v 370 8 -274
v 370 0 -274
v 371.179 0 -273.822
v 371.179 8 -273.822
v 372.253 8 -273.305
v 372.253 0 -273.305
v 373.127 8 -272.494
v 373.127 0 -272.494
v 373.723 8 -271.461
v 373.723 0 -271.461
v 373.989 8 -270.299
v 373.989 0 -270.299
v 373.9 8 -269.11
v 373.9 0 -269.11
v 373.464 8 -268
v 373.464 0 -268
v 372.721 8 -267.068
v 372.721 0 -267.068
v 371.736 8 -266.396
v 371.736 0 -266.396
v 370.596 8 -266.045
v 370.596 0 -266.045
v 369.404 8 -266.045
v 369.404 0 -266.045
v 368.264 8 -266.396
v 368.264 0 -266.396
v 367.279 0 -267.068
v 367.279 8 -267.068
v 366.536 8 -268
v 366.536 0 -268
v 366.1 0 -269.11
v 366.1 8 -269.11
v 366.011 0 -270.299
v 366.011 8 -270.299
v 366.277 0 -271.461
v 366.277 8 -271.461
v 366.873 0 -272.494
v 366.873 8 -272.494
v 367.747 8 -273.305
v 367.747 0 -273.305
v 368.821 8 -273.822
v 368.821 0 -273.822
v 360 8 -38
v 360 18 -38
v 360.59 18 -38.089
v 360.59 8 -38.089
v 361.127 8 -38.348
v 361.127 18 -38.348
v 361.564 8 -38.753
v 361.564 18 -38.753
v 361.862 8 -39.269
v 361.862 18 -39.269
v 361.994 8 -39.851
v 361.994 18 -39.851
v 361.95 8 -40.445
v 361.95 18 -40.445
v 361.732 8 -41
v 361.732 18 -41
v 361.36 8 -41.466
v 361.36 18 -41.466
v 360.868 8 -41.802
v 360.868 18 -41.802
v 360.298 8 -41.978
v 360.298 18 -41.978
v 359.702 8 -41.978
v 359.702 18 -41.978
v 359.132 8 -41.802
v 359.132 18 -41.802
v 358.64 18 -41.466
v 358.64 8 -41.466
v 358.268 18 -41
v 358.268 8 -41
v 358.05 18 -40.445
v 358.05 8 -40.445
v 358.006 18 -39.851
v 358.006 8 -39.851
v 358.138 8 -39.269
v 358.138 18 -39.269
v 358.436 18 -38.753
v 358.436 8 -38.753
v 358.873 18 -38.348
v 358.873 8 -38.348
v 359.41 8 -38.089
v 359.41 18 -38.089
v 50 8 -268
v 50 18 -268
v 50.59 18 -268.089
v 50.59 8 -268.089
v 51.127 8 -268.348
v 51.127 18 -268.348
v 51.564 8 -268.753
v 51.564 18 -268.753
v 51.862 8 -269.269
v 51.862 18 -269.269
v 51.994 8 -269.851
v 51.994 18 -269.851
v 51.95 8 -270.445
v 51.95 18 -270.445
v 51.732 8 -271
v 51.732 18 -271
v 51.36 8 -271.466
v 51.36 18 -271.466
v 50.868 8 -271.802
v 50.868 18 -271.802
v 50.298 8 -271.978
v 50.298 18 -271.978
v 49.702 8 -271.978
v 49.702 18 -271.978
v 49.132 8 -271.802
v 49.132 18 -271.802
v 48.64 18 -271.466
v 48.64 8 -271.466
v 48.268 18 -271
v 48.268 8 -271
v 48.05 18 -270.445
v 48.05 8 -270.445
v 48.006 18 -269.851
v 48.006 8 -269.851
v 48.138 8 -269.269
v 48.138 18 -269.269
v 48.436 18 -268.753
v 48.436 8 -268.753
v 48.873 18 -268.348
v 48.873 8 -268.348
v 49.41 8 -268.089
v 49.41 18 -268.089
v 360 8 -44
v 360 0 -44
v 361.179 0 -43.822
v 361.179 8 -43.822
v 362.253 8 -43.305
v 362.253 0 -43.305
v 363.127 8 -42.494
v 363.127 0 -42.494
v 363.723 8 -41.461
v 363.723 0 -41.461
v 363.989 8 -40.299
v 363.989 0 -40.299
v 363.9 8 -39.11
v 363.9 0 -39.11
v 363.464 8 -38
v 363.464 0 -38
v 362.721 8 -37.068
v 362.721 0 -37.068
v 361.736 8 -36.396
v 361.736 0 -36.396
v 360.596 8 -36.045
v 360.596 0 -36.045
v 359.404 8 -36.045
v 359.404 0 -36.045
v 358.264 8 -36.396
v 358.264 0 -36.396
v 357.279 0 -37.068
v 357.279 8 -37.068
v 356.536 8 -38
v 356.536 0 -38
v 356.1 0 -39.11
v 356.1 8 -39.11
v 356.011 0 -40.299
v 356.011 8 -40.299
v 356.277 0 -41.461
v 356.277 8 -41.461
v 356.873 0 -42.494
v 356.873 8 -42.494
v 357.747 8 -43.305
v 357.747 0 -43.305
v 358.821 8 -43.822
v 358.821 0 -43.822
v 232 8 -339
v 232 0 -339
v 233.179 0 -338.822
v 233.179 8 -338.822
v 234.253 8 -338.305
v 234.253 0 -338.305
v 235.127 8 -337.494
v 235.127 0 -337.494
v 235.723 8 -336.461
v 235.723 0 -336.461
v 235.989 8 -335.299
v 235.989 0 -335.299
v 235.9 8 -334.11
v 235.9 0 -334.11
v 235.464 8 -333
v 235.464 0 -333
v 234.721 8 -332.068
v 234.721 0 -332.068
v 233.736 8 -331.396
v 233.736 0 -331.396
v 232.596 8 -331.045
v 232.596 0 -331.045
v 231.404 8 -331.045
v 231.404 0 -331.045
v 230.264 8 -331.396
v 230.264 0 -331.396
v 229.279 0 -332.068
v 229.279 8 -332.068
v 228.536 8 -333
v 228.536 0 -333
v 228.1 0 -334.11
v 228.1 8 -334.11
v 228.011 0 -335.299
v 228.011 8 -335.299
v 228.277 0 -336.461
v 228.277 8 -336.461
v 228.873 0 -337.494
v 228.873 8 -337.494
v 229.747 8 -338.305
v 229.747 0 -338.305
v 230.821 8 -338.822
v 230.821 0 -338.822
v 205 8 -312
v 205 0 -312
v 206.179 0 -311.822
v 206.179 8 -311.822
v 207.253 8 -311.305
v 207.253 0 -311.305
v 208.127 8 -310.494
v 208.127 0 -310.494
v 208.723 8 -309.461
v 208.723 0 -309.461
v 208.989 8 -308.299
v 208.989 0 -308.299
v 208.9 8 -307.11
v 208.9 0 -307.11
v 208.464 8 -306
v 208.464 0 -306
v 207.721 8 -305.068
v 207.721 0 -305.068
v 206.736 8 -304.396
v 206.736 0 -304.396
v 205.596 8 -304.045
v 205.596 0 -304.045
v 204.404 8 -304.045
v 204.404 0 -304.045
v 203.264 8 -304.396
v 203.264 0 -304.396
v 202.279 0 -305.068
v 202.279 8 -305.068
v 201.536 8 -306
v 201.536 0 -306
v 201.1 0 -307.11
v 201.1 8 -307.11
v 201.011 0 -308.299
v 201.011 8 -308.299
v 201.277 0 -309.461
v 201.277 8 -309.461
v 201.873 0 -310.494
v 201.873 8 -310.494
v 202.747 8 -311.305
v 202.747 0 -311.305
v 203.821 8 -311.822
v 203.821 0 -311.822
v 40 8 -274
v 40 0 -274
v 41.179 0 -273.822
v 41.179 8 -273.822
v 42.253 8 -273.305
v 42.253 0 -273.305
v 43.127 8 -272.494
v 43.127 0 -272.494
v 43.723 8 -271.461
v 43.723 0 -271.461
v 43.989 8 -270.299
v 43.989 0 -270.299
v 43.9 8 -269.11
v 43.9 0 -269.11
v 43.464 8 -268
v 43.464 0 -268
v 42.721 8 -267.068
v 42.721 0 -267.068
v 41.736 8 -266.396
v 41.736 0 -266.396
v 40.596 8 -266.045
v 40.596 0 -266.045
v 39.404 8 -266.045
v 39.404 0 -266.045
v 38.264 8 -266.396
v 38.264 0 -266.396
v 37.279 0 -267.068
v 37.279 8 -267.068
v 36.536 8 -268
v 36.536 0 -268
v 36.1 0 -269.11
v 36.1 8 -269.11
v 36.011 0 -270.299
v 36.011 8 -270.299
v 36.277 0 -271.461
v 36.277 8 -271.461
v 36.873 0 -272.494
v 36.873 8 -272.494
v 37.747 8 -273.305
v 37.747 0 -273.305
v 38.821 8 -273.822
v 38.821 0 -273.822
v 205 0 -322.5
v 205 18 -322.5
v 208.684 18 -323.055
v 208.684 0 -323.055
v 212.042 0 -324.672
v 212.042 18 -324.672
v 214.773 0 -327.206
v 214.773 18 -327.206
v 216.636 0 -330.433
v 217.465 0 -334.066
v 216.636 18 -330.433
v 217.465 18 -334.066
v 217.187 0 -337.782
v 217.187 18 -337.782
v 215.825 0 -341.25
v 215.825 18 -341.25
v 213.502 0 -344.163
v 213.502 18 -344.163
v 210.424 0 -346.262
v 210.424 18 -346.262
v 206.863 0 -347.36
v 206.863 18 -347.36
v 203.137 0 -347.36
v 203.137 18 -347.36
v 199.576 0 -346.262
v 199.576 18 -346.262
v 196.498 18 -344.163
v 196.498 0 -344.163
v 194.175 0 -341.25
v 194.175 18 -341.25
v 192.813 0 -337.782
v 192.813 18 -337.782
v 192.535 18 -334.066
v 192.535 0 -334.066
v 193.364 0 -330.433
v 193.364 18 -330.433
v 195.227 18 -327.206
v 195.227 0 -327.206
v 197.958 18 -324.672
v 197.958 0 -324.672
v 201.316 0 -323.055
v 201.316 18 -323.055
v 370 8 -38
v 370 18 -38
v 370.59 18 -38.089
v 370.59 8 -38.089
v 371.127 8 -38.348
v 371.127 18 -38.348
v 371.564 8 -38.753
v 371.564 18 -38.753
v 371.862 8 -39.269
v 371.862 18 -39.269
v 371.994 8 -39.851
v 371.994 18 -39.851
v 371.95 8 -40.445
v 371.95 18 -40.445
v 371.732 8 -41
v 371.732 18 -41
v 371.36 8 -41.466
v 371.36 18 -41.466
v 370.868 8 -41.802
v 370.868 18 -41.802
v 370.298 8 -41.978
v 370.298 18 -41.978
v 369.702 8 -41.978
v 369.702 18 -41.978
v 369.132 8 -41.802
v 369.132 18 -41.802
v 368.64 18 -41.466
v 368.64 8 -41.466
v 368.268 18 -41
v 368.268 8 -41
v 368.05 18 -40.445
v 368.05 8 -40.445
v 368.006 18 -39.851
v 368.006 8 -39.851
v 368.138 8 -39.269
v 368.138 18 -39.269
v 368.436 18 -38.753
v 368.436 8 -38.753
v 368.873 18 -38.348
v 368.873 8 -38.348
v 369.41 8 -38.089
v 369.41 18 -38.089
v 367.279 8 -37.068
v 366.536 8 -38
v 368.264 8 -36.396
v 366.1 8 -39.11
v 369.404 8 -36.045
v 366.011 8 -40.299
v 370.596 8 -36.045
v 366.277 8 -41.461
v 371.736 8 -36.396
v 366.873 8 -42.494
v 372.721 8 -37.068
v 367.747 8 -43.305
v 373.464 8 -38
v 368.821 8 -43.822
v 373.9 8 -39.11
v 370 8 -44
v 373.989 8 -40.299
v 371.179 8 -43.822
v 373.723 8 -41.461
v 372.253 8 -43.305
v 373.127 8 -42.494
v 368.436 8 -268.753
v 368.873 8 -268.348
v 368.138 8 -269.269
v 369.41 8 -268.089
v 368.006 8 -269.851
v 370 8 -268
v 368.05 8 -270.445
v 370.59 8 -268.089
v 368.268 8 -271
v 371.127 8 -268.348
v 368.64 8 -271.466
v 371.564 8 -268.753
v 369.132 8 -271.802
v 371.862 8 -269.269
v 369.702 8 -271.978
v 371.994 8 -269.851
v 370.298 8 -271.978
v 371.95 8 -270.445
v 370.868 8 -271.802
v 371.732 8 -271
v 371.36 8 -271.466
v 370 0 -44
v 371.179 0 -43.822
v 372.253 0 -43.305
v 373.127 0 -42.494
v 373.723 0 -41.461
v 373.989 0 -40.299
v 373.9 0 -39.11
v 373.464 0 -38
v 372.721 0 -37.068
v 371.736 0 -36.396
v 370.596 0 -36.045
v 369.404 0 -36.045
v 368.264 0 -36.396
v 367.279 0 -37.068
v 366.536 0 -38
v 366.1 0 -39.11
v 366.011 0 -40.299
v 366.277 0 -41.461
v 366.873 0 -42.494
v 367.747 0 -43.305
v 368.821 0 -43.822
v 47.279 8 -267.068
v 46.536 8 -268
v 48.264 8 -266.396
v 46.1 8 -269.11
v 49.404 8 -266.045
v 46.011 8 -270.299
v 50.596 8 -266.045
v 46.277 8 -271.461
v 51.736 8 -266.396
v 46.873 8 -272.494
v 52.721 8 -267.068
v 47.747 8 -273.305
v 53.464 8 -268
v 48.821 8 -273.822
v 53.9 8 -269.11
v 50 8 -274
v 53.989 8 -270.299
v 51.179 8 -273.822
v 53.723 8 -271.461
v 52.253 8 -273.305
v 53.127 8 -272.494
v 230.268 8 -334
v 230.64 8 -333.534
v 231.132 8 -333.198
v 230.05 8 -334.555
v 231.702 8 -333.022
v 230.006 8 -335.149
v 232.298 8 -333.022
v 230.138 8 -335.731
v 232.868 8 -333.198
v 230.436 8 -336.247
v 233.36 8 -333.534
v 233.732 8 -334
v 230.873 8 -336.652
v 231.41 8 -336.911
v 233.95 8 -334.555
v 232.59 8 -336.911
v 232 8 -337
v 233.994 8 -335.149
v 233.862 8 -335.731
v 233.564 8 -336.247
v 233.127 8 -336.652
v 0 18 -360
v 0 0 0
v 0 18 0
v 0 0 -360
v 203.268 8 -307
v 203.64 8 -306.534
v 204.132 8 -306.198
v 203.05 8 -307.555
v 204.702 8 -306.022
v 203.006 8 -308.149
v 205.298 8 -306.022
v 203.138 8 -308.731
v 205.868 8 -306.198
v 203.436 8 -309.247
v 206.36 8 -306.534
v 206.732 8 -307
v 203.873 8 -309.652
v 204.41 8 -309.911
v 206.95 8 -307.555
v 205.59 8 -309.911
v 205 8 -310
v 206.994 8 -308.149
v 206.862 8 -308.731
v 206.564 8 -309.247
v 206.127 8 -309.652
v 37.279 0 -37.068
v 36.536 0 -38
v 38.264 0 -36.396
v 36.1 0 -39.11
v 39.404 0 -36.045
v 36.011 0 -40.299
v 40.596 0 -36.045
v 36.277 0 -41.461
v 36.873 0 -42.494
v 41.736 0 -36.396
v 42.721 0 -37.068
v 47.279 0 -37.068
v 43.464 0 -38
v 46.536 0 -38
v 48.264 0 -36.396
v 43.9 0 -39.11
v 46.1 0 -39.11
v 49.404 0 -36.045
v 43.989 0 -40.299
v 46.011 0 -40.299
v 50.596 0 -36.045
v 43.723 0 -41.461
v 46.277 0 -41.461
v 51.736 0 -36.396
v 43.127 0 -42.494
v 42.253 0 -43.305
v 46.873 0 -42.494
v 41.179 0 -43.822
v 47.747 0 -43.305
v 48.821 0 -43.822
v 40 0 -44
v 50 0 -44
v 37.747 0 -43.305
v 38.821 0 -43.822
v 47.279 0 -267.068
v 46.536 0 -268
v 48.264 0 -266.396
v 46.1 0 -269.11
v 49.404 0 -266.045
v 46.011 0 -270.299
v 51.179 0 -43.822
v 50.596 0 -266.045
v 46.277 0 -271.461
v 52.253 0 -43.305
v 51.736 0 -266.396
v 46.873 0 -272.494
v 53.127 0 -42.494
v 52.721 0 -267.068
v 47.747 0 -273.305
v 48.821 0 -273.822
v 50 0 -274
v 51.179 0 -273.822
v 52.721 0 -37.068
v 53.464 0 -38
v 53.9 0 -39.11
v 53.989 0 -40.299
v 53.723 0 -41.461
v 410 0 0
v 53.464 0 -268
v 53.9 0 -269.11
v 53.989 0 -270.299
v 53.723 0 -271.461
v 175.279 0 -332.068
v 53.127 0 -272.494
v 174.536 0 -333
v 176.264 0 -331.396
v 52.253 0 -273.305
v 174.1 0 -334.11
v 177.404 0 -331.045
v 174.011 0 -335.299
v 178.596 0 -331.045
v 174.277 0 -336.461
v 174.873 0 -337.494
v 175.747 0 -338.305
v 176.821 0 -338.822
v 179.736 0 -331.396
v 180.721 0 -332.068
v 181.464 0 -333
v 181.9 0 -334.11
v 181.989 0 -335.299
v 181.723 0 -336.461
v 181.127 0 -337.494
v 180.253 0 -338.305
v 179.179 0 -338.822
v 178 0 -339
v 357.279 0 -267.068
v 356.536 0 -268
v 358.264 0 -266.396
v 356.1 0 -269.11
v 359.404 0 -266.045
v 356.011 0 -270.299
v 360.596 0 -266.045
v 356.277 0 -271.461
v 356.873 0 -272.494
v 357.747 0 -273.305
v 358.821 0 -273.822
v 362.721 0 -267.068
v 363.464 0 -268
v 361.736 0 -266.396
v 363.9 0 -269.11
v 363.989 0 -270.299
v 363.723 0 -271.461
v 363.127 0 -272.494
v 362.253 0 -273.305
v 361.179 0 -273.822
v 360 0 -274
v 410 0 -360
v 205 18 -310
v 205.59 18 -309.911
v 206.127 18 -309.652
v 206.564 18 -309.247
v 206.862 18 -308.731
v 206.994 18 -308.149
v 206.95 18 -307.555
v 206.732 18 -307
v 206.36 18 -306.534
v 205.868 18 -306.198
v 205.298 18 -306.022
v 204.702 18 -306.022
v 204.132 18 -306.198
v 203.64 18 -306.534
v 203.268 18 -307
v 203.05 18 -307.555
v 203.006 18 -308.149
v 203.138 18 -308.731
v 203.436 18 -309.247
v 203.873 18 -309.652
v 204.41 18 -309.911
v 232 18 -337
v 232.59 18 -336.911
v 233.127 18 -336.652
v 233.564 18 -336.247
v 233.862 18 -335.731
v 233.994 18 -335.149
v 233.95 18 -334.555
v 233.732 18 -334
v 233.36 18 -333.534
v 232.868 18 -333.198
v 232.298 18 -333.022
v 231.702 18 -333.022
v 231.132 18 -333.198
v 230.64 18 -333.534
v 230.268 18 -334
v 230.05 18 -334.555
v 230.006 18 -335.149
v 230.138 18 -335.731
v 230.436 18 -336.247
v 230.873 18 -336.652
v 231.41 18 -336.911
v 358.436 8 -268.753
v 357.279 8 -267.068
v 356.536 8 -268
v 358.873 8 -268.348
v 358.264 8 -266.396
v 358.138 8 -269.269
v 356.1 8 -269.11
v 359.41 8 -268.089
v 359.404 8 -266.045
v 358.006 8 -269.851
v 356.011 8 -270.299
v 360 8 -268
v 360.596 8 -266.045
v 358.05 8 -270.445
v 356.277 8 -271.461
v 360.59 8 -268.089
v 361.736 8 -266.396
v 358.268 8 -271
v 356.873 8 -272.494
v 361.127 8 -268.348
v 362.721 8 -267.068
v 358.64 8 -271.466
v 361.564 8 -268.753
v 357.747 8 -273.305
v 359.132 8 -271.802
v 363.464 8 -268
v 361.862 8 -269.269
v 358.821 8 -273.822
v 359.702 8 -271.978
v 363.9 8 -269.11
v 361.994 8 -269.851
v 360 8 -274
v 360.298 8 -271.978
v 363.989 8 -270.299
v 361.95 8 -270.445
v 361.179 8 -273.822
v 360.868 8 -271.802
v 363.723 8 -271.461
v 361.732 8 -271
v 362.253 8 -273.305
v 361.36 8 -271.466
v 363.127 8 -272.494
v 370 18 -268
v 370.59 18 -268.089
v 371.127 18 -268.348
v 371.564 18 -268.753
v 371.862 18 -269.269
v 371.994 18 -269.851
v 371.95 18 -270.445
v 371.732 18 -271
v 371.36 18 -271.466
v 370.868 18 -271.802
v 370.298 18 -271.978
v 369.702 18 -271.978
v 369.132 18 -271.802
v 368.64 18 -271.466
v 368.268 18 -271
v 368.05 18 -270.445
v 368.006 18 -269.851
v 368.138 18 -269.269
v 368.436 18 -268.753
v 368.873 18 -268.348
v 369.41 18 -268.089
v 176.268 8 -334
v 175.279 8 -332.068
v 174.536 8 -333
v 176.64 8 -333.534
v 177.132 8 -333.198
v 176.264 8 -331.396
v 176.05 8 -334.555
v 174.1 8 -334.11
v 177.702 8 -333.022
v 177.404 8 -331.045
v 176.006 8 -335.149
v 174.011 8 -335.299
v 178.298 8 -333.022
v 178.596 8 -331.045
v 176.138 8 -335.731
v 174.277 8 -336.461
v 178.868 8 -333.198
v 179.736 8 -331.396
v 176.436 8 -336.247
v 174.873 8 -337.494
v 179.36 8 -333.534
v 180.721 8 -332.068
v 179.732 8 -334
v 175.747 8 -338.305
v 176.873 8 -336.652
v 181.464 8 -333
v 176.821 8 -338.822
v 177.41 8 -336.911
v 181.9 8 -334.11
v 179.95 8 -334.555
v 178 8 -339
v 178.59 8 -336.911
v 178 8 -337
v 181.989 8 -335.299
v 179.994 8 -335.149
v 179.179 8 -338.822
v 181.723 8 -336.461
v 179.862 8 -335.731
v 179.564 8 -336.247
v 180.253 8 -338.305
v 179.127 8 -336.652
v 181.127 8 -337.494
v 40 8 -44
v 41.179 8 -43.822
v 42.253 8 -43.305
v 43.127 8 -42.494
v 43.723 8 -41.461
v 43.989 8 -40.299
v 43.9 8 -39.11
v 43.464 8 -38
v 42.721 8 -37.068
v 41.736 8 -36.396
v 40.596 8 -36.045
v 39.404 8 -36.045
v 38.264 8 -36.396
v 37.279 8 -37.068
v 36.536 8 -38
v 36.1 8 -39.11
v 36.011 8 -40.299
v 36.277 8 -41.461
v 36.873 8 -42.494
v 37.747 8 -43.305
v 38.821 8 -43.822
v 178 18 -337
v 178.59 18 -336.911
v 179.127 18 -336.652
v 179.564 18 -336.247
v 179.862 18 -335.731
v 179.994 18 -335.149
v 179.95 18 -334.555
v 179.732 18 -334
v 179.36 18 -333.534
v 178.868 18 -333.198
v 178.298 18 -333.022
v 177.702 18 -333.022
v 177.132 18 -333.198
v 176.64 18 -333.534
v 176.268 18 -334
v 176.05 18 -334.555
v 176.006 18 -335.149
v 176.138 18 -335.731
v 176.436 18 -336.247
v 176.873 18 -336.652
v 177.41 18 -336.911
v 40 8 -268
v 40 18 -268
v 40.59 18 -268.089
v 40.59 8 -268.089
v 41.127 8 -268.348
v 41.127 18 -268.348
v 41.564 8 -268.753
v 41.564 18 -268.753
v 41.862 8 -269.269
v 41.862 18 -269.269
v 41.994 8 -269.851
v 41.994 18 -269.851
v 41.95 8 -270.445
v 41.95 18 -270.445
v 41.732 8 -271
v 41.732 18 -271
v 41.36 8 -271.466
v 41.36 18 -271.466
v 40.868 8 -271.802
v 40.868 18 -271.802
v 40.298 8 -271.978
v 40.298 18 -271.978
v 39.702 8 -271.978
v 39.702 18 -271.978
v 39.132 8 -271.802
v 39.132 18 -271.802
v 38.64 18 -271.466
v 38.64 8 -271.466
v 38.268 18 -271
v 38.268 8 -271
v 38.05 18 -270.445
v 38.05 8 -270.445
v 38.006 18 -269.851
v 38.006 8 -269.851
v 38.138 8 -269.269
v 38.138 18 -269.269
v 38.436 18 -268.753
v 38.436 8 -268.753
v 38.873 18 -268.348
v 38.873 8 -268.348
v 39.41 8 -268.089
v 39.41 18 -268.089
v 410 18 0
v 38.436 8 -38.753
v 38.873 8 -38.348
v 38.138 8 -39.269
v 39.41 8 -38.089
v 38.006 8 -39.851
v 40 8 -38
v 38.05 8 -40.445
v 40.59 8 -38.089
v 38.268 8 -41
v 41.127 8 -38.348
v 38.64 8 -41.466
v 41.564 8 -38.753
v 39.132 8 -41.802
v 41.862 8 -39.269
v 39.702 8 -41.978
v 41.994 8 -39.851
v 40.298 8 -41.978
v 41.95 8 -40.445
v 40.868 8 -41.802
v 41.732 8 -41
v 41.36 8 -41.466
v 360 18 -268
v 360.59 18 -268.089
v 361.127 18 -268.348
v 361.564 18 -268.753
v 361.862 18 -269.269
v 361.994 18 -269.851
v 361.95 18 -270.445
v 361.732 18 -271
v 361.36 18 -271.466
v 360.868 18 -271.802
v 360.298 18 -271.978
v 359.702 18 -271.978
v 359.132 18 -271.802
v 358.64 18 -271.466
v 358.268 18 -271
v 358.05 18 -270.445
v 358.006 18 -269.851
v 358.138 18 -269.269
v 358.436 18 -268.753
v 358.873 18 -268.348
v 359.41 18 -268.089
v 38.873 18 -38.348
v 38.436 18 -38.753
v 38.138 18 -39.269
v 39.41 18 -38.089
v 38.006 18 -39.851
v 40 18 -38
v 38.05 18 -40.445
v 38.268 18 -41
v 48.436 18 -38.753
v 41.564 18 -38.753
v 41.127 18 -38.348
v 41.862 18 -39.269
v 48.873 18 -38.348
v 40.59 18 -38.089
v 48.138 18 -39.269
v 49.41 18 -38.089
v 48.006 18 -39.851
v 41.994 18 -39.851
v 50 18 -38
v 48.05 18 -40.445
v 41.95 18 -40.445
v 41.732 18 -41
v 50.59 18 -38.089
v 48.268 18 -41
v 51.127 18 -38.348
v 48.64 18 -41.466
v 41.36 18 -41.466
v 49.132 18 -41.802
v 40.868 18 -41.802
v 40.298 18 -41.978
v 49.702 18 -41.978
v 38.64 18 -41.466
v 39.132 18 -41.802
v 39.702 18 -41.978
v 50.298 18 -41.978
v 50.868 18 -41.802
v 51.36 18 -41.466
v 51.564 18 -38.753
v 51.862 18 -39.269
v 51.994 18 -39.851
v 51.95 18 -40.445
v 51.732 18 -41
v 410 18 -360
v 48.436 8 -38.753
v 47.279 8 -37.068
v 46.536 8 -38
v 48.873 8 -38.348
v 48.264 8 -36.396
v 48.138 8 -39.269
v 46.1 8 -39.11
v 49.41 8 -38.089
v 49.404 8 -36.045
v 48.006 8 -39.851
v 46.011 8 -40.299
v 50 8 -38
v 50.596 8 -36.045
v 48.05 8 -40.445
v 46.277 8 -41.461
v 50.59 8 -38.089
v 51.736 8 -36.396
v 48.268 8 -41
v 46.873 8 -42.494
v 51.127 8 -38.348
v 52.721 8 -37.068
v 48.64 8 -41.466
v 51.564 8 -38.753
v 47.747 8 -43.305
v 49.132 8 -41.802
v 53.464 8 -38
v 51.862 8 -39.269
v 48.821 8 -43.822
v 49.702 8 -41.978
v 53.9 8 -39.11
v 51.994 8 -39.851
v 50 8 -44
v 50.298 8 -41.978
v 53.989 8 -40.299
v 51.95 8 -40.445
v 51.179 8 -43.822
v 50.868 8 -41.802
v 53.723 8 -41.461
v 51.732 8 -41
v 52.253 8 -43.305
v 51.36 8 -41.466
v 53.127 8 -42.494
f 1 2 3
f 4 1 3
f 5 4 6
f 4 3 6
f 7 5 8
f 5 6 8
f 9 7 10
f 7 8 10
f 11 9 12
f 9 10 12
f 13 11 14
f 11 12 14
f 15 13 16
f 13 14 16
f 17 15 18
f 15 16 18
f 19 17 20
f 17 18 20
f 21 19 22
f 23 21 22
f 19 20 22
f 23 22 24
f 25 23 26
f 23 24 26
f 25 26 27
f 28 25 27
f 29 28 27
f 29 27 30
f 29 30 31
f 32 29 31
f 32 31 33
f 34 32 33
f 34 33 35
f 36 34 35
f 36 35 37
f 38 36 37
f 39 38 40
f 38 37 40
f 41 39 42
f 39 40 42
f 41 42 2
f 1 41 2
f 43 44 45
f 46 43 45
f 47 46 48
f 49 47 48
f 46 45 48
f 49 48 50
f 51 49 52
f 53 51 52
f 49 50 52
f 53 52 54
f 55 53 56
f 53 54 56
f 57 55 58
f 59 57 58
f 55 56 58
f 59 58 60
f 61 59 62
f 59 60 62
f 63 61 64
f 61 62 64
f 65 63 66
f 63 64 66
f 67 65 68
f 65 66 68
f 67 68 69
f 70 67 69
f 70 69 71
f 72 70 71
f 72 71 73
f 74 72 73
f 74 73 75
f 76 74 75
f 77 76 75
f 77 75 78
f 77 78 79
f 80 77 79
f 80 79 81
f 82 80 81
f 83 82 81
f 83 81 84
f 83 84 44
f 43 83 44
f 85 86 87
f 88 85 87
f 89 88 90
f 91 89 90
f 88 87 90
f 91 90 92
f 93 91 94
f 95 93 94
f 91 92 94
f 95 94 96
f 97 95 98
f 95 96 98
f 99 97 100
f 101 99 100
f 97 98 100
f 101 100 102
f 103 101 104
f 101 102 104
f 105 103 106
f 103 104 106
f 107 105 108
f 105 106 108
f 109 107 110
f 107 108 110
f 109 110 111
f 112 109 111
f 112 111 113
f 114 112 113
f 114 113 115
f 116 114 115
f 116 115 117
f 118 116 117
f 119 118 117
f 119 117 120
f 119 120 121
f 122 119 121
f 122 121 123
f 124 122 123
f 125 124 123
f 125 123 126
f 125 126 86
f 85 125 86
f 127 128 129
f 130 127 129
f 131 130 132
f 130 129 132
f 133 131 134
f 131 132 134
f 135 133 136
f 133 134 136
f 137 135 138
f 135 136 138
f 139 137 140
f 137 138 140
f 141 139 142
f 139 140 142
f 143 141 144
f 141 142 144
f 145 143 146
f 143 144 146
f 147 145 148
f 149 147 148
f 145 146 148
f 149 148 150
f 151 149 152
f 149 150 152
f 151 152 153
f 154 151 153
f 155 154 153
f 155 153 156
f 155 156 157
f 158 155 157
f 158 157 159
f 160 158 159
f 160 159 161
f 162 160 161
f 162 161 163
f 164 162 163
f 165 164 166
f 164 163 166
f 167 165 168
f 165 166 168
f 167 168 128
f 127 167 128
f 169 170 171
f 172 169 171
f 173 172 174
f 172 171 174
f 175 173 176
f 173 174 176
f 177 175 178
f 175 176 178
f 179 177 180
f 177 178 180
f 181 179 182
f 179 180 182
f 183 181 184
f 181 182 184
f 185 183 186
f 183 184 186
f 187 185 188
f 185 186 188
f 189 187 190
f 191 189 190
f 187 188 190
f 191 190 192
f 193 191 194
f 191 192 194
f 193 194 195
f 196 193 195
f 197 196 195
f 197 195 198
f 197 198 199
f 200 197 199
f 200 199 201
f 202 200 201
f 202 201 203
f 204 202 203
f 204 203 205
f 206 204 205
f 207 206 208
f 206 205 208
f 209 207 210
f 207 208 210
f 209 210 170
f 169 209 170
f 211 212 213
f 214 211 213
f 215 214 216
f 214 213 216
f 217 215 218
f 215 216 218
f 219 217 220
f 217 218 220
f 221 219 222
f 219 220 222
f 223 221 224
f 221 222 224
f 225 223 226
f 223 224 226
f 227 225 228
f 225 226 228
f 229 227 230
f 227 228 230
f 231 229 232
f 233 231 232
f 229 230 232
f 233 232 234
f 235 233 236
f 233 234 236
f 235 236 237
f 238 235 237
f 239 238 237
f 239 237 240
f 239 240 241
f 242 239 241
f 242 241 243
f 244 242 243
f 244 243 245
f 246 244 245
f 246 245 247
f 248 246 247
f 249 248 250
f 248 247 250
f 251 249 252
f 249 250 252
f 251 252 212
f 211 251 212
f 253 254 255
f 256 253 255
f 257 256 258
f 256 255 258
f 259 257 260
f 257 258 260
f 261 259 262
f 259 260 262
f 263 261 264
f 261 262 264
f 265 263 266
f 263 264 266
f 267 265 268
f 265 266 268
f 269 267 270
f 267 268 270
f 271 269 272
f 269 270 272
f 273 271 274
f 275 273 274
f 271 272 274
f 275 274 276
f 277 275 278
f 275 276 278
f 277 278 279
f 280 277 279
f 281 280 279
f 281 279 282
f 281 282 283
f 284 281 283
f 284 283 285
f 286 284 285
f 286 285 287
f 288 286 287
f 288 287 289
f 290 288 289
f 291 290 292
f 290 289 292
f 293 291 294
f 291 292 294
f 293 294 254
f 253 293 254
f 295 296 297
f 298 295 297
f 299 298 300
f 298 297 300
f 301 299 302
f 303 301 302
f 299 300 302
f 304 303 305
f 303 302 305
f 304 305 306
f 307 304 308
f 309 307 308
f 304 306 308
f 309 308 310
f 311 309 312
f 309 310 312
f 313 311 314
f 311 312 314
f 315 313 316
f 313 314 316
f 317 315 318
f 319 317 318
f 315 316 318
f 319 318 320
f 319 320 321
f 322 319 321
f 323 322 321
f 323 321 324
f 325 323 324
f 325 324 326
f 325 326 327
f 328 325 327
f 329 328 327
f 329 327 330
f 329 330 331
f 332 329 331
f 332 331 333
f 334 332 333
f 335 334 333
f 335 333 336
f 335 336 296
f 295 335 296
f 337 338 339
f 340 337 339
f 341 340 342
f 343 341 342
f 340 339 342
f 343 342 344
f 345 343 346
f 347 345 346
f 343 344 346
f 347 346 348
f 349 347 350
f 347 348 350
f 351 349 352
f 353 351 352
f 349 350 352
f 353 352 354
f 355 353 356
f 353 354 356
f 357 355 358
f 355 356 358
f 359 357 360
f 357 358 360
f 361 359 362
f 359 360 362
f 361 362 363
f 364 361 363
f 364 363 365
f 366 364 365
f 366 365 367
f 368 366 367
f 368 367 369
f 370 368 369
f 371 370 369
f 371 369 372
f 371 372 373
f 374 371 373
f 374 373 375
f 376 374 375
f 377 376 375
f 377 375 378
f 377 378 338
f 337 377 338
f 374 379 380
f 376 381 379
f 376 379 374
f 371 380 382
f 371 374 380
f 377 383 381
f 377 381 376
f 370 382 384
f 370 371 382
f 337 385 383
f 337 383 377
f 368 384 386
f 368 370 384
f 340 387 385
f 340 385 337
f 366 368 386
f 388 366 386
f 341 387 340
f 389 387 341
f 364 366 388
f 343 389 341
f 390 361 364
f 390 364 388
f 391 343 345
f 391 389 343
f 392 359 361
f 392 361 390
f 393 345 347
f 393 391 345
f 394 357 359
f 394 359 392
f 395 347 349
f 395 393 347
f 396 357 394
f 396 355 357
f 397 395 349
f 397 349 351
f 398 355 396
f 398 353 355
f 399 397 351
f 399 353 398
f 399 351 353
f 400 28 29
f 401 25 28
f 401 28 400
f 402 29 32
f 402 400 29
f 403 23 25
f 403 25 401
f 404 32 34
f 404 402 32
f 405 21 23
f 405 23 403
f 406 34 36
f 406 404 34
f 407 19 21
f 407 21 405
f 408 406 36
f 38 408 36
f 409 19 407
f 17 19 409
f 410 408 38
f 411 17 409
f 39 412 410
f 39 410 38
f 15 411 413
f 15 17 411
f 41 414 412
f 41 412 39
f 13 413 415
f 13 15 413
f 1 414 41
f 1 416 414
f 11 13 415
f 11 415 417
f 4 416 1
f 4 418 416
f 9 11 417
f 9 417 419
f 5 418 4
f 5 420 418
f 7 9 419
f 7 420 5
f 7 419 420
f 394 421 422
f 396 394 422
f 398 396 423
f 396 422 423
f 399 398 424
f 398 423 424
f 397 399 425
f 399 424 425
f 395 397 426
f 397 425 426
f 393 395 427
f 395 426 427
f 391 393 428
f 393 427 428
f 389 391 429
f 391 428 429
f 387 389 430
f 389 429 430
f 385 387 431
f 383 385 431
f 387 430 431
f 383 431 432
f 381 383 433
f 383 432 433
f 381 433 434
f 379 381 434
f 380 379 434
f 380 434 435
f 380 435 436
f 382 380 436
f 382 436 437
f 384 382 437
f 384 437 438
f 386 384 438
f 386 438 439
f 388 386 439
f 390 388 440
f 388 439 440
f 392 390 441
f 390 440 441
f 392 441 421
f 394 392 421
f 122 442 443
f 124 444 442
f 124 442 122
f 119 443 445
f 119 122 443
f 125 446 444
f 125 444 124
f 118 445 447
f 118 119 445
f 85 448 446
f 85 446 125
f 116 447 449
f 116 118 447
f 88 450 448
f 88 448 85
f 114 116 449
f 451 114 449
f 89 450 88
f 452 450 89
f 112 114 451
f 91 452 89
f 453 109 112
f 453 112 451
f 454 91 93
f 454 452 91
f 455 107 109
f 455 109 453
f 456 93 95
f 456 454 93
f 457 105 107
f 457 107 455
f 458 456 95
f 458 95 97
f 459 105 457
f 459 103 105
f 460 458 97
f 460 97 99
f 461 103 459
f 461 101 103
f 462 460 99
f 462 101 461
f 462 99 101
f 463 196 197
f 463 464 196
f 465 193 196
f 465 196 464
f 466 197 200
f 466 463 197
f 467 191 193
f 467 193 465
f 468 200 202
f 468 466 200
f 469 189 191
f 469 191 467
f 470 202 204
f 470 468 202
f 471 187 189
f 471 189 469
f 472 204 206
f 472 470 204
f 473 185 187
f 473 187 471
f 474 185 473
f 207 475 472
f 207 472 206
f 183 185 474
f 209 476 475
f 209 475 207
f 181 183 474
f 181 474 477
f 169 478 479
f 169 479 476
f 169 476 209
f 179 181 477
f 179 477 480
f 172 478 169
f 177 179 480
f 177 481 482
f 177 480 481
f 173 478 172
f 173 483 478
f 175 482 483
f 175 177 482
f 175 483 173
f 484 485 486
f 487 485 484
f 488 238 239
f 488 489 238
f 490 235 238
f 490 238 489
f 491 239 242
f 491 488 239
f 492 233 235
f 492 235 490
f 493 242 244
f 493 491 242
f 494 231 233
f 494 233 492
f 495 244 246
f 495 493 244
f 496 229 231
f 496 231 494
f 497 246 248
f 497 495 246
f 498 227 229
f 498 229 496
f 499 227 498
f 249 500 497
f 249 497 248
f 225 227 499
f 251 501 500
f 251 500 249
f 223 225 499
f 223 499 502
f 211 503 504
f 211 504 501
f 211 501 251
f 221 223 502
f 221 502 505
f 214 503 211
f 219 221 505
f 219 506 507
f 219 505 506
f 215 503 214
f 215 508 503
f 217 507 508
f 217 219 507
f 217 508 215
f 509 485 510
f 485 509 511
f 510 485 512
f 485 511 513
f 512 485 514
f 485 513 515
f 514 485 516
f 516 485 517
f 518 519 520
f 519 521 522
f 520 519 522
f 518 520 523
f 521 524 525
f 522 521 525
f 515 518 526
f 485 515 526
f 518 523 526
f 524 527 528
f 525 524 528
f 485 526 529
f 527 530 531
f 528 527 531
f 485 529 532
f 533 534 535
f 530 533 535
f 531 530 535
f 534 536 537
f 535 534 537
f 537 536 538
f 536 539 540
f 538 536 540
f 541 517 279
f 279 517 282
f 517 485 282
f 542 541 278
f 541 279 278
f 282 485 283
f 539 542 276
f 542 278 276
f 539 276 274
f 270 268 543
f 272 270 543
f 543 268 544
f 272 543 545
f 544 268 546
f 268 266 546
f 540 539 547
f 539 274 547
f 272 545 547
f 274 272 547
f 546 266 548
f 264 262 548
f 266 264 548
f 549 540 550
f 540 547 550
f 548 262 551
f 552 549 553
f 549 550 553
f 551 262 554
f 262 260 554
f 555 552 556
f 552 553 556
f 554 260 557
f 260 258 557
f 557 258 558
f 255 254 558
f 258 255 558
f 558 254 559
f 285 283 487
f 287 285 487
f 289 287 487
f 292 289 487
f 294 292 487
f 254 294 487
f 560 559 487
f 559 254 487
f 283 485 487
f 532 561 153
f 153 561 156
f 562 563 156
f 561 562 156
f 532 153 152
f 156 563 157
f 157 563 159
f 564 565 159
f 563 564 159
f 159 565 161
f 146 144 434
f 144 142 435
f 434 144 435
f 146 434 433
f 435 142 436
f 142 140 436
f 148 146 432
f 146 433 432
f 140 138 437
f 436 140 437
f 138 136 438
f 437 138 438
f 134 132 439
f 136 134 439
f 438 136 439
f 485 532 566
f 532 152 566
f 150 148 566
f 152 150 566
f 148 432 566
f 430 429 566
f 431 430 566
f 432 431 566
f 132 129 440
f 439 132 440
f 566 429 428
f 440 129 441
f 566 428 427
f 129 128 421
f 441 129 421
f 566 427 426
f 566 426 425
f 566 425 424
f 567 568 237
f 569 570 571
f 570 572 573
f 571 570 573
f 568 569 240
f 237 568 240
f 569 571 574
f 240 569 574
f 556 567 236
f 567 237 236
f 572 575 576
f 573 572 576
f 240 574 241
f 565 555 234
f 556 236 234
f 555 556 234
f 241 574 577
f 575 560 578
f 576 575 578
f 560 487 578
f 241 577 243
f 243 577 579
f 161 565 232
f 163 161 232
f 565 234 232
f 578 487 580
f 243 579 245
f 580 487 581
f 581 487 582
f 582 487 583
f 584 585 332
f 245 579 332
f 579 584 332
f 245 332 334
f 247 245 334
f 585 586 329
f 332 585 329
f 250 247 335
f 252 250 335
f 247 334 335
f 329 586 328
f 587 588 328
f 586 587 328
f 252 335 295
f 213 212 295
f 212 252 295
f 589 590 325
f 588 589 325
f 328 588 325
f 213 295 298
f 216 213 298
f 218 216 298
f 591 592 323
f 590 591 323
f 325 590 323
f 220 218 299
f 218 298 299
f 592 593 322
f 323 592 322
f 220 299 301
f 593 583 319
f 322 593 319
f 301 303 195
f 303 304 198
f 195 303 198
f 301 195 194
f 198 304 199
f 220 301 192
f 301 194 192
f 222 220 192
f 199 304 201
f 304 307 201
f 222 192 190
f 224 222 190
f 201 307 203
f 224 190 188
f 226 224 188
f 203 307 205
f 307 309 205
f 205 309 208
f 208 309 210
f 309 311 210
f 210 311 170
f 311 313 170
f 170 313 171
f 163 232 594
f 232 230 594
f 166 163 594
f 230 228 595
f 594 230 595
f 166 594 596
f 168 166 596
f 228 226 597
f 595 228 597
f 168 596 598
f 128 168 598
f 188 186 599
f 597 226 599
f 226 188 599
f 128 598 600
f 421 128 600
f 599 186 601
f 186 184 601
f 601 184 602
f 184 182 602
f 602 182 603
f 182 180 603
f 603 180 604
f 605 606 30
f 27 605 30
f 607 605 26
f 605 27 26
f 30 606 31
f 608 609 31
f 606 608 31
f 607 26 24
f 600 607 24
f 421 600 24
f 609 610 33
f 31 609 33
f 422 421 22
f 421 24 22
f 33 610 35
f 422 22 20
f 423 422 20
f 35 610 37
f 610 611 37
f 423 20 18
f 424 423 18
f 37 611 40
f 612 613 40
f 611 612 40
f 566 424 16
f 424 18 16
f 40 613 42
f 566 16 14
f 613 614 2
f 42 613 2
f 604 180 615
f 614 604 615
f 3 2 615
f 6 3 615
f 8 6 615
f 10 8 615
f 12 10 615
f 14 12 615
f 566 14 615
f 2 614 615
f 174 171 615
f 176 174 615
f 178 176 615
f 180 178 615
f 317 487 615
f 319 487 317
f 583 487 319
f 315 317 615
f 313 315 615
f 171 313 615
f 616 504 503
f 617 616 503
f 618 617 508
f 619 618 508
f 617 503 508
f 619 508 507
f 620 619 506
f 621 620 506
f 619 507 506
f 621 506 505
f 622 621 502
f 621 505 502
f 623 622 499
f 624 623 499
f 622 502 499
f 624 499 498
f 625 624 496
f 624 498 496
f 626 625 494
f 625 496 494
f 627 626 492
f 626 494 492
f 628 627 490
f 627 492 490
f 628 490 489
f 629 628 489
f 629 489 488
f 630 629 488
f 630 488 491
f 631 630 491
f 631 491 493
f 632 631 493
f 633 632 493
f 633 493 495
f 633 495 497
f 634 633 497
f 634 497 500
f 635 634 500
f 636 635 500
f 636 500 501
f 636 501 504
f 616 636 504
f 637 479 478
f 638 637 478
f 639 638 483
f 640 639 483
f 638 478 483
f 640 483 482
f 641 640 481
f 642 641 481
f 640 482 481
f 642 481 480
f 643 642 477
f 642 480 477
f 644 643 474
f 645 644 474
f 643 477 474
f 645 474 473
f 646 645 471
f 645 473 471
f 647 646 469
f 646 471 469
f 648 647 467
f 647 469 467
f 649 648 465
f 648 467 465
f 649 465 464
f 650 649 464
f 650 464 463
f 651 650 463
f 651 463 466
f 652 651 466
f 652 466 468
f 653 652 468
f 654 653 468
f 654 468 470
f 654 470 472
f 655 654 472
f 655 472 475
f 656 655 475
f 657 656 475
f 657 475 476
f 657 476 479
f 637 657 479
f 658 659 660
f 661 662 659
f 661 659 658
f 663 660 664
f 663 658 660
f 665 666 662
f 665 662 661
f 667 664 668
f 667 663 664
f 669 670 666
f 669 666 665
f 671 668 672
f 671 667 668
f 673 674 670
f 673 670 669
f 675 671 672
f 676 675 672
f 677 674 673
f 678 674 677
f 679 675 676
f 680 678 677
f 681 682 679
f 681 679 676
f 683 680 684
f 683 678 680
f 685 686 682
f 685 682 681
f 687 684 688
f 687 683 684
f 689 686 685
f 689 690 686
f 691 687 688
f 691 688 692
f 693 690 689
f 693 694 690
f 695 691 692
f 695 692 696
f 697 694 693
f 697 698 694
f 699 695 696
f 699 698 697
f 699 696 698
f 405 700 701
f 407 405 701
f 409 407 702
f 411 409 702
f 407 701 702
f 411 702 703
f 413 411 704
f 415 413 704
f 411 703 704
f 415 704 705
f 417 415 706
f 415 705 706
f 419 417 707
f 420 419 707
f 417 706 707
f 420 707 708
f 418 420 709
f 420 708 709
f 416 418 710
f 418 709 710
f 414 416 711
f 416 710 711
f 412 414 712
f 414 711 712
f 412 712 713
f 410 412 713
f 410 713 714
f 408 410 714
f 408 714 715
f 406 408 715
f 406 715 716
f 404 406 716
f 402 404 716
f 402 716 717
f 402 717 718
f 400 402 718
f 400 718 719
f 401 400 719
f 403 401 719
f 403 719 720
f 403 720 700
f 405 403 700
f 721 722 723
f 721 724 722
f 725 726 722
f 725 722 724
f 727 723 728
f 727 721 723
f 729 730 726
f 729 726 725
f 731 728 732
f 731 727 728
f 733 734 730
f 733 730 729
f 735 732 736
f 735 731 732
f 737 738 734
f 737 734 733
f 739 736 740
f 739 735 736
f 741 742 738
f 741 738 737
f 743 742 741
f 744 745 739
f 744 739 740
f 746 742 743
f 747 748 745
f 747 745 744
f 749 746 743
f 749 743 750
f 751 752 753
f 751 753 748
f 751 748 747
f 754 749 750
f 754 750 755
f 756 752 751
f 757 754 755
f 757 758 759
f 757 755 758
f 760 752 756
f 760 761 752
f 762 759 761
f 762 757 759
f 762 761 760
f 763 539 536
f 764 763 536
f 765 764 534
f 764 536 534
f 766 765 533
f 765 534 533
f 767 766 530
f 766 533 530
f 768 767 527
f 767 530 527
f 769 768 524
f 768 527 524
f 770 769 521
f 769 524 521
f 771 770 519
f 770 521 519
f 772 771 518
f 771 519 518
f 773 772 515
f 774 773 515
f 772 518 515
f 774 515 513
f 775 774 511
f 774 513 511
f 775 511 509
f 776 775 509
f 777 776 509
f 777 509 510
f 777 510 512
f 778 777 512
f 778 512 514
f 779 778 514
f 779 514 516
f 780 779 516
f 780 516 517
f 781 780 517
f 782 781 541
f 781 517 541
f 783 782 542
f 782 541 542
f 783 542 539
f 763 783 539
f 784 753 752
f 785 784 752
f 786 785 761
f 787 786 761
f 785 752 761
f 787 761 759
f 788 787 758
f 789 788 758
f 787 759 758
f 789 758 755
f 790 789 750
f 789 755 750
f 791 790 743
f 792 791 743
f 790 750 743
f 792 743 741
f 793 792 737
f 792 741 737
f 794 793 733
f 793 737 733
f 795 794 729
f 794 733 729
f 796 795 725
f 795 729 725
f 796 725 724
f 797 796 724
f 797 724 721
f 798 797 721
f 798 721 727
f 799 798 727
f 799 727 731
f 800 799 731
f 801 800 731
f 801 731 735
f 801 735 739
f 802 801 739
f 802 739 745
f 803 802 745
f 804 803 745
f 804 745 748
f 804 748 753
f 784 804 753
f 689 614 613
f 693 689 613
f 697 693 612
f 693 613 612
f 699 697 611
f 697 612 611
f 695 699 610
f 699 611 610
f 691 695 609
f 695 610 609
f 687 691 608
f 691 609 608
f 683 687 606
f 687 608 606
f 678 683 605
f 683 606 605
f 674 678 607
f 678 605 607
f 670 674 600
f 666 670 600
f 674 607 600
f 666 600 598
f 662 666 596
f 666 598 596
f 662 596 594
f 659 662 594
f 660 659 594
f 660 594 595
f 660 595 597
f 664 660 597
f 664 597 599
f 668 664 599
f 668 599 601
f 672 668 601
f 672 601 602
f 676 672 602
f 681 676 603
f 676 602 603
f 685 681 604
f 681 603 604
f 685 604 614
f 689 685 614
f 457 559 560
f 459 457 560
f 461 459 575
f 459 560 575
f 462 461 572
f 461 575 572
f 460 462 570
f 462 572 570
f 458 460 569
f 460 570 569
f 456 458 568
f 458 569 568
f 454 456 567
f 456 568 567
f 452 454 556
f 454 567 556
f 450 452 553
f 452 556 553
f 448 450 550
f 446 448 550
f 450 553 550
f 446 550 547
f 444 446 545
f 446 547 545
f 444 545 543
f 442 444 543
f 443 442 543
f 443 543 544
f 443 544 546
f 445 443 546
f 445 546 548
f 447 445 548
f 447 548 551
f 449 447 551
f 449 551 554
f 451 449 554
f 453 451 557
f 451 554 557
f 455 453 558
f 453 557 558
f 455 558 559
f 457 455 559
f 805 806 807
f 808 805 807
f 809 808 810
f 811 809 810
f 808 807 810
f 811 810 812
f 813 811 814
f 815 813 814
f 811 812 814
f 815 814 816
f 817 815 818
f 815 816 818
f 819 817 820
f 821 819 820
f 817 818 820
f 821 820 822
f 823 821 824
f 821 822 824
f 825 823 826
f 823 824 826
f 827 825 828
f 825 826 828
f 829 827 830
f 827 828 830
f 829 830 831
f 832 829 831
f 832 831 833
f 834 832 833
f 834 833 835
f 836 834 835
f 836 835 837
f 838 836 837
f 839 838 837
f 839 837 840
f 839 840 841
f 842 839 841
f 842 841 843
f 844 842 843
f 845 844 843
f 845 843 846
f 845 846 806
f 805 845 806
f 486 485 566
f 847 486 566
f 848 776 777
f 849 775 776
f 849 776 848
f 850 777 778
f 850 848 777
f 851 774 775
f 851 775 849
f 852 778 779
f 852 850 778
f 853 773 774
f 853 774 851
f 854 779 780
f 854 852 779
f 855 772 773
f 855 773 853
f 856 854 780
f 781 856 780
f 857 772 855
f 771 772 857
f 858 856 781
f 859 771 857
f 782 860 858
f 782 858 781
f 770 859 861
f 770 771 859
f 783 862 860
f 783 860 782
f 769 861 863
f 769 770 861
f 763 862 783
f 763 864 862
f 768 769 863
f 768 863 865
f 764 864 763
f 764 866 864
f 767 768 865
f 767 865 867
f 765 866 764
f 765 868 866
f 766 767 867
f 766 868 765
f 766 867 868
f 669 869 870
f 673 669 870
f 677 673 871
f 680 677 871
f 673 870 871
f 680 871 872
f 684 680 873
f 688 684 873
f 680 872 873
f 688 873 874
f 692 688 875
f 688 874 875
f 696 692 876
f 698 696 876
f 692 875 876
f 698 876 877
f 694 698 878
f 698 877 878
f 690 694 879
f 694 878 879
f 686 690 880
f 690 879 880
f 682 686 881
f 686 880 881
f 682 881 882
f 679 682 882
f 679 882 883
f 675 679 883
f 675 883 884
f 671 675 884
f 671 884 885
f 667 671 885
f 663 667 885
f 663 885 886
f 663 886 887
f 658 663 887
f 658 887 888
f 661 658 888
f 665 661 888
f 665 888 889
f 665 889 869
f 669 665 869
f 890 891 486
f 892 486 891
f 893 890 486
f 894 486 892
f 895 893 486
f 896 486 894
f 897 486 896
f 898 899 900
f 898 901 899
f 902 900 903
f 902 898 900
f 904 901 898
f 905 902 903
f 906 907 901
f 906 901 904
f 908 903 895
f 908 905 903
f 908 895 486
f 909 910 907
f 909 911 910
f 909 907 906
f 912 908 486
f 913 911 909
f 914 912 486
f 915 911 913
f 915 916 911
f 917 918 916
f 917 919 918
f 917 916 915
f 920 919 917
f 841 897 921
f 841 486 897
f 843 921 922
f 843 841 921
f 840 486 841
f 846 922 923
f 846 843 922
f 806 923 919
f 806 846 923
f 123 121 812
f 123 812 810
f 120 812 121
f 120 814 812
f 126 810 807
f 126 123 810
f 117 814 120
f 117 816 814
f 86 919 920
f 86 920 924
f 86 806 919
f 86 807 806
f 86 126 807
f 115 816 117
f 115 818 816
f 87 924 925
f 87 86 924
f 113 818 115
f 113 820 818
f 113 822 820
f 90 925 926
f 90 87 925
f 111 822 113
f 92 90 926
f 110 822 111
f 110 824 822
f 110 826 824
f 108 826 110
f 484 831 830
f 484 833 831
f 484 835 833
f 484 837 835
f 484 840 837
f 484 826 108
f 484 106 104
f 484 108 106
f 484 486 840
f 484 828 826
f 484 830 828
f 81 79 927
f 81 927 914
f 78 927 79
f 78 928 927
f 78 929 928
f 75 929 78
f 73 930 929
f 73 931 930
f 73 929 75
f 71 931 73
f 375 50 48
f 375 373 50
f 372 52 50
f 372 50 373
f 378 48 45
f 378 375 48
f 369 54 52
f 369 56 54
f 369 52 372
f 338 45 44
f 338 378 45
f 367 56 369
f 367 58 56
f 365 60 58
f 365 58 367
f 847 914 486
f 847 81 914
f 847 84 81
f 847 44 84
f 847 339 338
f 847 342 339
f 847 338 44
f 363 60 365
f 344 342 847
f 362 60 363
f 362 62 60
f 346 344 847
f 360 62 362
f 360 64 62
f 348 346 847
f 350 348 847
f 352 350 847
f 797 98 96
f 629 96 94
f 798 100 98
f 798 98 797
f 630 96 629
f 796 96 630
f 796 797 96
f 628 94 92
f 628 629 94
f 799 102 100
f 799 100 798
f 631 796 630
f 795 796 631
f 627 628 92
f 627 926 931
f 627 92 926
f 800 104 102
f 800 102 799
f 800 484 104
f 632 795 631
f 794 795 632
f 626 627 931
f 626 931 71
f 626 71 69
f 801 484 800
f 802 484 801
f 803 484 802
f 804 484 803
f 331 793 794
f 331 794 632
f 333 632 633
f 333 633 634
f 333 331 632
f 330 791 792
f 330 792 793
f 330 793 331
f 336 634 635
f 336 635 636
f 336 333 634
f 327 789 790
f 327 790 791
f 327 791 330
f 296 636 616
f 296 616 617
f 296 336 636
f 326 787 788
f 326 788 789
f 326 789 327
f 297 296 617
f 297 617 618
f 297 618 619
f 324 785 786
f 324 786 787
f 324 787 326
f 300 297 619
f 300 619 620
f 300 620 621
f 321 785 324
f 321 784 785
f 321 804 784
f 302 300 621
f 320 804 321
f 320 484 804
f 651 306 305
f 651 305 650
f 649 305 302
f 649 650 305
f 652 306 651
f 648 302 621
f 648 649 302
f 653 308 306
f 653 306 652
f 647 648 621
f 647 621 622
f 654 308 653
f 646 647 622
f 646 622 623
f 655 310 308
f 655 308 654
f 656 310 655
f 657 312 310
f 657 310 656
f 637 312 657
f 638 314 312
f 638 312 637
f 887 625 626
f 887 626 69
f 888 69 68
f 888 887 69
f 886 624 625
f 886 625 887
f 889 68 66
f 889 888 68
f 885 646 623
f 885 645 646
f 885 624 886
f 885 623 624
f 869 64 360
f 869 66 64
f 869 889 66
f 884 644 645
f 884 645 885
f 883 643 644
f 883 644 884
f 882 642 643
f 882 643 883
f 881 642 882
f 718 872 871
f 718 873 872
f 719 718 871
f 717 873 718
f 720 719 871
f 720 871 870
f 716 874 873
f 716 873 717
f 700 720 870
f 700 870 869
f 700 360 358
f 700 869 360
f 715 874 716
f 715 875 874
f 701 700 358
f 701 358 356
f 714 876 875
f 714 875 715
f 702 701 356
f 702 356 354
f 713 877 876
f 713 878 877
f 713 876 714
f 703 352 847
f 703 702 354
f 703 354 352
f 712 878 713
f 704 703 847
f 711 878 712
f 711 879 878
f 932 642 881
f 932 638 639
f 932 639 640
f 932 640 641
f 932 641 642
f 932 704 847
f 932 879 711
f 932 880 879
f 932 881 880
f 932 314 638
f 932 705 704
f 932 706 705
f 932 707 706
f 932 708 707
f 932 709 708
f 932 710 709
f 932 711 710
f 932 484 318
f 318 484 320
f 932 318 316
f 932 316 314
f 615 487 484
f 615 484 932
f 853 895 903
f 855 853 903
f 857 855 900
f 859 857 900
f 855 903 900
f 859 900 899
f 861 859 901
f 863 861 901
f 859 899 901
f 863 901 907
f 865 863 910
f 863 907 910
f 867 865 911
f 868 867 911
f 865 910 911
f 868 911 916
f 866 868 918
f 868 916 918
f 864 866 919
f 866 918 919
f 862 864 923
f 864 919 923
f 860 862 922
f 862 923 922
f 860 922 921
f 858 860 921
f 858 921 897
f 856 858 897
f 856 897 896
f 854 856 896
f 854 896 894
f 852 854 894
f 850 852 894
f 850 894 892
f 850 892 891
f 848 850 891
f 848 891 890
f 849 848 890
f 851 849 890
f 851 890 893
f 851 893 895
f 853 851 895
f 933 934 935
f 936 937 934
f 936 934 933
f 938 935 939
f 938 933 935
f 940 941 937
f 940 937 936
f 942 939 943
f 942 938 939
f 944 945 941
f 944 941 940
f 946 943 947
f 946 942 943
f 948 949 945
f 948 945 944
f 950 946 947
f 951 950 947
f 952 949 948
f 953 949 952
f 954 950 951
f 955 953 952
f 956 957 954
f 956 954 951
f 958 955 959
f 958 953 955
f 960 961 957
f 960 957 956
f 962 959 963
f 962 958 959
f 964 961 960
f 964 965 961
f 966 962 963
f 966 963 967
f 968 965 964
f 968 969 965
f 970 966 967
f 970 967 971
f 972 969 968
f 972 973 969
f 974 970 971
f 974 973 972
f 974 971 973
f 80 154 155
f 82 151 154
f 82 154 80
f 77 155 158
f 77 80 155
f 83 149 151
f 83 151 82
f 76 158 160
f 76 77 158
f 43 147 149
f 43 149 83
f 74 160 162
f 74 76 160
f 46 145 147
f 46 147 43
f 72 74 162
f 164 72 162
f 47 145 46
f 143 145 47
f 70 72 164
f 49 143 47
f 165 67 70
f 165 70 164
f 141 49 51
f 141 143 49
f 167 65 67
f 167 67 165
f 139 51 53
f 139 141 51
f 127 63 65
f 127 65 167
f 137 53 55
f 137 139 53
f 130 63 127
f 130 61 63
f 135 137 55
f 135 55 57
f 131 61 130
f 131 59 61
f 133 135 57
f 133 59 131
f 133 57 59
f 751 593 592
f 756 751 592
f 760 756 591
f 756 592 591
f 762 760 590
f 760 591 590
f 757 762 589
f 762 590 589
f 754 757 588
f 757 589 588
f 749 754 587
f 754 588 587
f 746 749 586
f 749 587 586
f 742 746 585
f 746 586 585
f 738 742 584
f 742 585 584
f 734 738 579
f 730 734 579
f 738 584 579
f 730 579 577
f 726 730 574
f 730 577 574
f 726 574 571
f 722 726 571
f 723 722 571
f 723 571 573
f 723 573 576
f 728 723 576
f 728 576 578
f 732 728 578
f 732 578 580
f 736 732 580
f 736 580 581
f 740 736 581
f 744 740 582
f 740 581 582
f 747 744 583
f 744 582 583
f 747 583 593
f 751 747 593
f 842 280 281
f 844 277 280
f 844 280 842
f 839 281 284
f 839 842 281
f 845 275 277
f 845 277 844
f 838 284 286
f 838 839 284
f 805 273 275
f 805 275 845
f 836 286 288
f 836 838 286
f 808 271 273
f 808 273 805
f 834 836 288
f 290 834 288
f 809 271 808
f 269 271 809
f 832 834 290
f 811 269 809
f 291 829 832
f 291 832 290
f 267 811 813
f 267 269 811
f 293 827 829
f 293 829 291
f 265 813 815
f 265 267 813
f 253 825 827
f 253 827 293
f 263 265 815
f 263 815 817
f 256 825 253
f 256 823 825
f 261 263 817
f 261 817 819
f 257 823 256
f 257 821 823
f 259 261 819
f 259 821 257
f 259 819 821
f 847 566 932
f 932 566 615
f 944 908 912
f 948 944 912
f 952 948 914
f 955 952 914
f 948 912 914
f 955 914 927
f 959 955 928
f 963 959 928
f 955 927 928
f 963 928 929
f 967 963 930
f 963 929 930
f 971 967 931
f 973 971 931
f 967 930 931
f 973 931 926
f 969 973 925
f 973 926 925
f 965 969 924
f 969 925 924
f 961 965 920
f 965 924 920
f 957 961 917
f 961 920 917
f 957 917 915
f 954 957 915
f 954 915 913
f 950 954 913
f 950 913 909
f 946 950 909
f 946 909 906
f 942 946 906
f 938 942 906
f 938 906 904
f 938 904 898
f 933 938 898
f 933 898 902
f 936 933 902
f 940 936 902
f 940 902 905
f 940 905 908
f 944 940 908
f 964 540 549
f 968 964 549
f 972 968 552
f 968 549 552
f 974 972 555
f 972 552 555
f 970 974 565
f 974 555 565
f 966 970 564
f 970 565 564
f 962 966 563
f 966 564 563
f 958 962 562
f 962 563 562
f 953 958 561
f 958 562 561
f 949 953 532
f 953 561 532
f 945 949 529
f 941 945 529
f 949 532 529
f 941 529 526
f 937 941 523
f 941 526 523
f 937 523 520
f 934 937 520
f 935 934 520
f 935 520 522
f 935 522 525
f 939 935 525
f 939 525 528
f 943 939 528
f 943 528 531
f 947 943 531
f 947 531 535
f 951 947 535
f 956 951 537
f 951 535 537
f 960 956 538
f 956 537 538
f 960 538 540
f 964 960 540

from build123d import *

# Parameters (mm, degrees)
SKETCH1_W                          = 410
SKETCH1_H                          = 360
BOSS_EXTRUDE1_DEPTH                = 18
SKETCH2_R                          = 12.5
CAMERA_STAND_TO_BASE_PROFILE_DEPTH = 546.915744415
SKETCH3_R                          = 2
CUT_EXTRUDE2_DEPTH                 = 546.915744415
SKETCH6_R                          = 2
CAMERA_STAND_TO_BASE_SCREW_DEPTH   = 546.915744415
SKETCH7_R                          = 4
CUT_EXTRUDE3_DEPTH                 = 8


with BuildPart() as part:
    # Sketch1 → Boss-Extrude1 (new body)
    with BuildSketch(Plane(origin=(0, 0, 0), x_dir=(1, 0, 0), z_dir=(0, 1, 0))):
        with Locations((205, 180)):
            Rectangle(SKETCH1_W, SKETCH1_H)
    extrude(amount=BOSS_EXTRUDE1_DEPTH)

    # Sketch2 → Camera Stand to Base (Profile) (cut, through all)
    with BuildSketch(Plane(origin=(0, 18, 0), x_dir=(1, 0, 0), z_dir=(0, 1, 0))):
        with Locations(Location((205, 335, 0), (0, 0, 270))):
            Circle(SKETCH2_R)
    extrude(amount=-CAMERA_STAND_TO_BASE_PROFILE_DEPTH, mode=Mode.SUBTRACT)

    # Sketch3 → Cut-Extrude2 (cut, through all)
    with BuildSketch(Plane(origin=(0, 18, 0), x_dir=(1, 0, 0), z_dir=(0, 1, 0))):
        with Locations(Location((40, 40, 0), (0, 0, 270))):
            Circle(SKETCH3_R)
        with Locations(Location((50, 40, 0), (0, 0, 270))):
            Circle(SKETCH3_R)
        with Locations(Location((360, 40, 0), (0, 0, 270))):
            Circle(SKETCH3_R)
        with Locations(Location((370, 40, 0), (0, 0, 270))):
            Circle(SKETCH3_R)
        with Locations(Location((370, 270, 0), (0, 0, 270))):
            Circle(SKETCH3_R)
        with Locations(Location((360, 270, 0), (0, 0, 270))):
            Circle(SKETCH3_R)
        with Locations(Location((40, 270, 0), (0, 0, 270))):
            Circle(SKETCH3_R)
        with Locations(Location((50, 270, 0), (0, 0, 270))):
            Circle(SKETCH3_R)
    extrude(amount=-CUT_EXTRUDE2_DEPTH, mode=Mode.SUBTRACT)

    # Sketch6 → Camera Stand to Base (Screw) (cut, through all)
    with BuildSketch(Plane.XZ):
        with Locations(Location((205, -308, 0), (0, 0, 270))):
            Circle(SKETCH6_R)
        with Locations(Location((178, -335, 0), (0, 0, 270))):
            Circle(SKETCH6_R)
        with Locations(Location((232, -335, 0), (0, 0, 270))):
            Circle(SKETCH6_R)
    extrude(amount=-CAMERA_STAND_TO_BASE_SCREW_DEPTH, mode=Mode.SUBTRACT)

    # Sketch7 → Cut-Extrude3 (cut)
    with BuildSketch(Plane.XZ):
        with Locations(Location((40, -40, 0), (0, 0, 270))):
            Circle(SKETCH7_R)
        with Locations(Location((50, -40, 0), (0, 0, 270))):
            Circle(SKETCH7_R)
        with Locations(Location((360, -40, 0), (0, 0, 270))):
            Circle(SKETCH7_R)
        with Locations(Location((370, -40, 0), (0, 0, 270))):
            Circle(SKETCH7_R)
        with Locations(Location((370, -270, 0), (0, 0, 270))):
            Circle(SKETCH7_R)
        with Locations(Location((360, -270, 0), (0, 0, 270))):
            Circle(SKETCH7_R)
        with Locations(Location((50, -270, 0), (0, 0, 270))):
            Circle(SKETCH7_R)
        with Locations(Location((40, -270, 0), (0, 0, 270))):
            Circle(SKETCH7_R)
        with Locations(Location((178, -335, 0), (0, 0, 270))):
            Circle(SKETCH7_R)
        with Locations(Location((205, -308, 0), (0, 0, 270))):
            Circle(SKETCH7_R)
        with Locations(Location((232, -335, 0), (0, 0, 270))):
            Circle(SKETCH7_R)
    extrude(amount=-CUT_EXTRUDE3_DEPTH, mode=Mode.SUBTRACT)


solid = part.part
